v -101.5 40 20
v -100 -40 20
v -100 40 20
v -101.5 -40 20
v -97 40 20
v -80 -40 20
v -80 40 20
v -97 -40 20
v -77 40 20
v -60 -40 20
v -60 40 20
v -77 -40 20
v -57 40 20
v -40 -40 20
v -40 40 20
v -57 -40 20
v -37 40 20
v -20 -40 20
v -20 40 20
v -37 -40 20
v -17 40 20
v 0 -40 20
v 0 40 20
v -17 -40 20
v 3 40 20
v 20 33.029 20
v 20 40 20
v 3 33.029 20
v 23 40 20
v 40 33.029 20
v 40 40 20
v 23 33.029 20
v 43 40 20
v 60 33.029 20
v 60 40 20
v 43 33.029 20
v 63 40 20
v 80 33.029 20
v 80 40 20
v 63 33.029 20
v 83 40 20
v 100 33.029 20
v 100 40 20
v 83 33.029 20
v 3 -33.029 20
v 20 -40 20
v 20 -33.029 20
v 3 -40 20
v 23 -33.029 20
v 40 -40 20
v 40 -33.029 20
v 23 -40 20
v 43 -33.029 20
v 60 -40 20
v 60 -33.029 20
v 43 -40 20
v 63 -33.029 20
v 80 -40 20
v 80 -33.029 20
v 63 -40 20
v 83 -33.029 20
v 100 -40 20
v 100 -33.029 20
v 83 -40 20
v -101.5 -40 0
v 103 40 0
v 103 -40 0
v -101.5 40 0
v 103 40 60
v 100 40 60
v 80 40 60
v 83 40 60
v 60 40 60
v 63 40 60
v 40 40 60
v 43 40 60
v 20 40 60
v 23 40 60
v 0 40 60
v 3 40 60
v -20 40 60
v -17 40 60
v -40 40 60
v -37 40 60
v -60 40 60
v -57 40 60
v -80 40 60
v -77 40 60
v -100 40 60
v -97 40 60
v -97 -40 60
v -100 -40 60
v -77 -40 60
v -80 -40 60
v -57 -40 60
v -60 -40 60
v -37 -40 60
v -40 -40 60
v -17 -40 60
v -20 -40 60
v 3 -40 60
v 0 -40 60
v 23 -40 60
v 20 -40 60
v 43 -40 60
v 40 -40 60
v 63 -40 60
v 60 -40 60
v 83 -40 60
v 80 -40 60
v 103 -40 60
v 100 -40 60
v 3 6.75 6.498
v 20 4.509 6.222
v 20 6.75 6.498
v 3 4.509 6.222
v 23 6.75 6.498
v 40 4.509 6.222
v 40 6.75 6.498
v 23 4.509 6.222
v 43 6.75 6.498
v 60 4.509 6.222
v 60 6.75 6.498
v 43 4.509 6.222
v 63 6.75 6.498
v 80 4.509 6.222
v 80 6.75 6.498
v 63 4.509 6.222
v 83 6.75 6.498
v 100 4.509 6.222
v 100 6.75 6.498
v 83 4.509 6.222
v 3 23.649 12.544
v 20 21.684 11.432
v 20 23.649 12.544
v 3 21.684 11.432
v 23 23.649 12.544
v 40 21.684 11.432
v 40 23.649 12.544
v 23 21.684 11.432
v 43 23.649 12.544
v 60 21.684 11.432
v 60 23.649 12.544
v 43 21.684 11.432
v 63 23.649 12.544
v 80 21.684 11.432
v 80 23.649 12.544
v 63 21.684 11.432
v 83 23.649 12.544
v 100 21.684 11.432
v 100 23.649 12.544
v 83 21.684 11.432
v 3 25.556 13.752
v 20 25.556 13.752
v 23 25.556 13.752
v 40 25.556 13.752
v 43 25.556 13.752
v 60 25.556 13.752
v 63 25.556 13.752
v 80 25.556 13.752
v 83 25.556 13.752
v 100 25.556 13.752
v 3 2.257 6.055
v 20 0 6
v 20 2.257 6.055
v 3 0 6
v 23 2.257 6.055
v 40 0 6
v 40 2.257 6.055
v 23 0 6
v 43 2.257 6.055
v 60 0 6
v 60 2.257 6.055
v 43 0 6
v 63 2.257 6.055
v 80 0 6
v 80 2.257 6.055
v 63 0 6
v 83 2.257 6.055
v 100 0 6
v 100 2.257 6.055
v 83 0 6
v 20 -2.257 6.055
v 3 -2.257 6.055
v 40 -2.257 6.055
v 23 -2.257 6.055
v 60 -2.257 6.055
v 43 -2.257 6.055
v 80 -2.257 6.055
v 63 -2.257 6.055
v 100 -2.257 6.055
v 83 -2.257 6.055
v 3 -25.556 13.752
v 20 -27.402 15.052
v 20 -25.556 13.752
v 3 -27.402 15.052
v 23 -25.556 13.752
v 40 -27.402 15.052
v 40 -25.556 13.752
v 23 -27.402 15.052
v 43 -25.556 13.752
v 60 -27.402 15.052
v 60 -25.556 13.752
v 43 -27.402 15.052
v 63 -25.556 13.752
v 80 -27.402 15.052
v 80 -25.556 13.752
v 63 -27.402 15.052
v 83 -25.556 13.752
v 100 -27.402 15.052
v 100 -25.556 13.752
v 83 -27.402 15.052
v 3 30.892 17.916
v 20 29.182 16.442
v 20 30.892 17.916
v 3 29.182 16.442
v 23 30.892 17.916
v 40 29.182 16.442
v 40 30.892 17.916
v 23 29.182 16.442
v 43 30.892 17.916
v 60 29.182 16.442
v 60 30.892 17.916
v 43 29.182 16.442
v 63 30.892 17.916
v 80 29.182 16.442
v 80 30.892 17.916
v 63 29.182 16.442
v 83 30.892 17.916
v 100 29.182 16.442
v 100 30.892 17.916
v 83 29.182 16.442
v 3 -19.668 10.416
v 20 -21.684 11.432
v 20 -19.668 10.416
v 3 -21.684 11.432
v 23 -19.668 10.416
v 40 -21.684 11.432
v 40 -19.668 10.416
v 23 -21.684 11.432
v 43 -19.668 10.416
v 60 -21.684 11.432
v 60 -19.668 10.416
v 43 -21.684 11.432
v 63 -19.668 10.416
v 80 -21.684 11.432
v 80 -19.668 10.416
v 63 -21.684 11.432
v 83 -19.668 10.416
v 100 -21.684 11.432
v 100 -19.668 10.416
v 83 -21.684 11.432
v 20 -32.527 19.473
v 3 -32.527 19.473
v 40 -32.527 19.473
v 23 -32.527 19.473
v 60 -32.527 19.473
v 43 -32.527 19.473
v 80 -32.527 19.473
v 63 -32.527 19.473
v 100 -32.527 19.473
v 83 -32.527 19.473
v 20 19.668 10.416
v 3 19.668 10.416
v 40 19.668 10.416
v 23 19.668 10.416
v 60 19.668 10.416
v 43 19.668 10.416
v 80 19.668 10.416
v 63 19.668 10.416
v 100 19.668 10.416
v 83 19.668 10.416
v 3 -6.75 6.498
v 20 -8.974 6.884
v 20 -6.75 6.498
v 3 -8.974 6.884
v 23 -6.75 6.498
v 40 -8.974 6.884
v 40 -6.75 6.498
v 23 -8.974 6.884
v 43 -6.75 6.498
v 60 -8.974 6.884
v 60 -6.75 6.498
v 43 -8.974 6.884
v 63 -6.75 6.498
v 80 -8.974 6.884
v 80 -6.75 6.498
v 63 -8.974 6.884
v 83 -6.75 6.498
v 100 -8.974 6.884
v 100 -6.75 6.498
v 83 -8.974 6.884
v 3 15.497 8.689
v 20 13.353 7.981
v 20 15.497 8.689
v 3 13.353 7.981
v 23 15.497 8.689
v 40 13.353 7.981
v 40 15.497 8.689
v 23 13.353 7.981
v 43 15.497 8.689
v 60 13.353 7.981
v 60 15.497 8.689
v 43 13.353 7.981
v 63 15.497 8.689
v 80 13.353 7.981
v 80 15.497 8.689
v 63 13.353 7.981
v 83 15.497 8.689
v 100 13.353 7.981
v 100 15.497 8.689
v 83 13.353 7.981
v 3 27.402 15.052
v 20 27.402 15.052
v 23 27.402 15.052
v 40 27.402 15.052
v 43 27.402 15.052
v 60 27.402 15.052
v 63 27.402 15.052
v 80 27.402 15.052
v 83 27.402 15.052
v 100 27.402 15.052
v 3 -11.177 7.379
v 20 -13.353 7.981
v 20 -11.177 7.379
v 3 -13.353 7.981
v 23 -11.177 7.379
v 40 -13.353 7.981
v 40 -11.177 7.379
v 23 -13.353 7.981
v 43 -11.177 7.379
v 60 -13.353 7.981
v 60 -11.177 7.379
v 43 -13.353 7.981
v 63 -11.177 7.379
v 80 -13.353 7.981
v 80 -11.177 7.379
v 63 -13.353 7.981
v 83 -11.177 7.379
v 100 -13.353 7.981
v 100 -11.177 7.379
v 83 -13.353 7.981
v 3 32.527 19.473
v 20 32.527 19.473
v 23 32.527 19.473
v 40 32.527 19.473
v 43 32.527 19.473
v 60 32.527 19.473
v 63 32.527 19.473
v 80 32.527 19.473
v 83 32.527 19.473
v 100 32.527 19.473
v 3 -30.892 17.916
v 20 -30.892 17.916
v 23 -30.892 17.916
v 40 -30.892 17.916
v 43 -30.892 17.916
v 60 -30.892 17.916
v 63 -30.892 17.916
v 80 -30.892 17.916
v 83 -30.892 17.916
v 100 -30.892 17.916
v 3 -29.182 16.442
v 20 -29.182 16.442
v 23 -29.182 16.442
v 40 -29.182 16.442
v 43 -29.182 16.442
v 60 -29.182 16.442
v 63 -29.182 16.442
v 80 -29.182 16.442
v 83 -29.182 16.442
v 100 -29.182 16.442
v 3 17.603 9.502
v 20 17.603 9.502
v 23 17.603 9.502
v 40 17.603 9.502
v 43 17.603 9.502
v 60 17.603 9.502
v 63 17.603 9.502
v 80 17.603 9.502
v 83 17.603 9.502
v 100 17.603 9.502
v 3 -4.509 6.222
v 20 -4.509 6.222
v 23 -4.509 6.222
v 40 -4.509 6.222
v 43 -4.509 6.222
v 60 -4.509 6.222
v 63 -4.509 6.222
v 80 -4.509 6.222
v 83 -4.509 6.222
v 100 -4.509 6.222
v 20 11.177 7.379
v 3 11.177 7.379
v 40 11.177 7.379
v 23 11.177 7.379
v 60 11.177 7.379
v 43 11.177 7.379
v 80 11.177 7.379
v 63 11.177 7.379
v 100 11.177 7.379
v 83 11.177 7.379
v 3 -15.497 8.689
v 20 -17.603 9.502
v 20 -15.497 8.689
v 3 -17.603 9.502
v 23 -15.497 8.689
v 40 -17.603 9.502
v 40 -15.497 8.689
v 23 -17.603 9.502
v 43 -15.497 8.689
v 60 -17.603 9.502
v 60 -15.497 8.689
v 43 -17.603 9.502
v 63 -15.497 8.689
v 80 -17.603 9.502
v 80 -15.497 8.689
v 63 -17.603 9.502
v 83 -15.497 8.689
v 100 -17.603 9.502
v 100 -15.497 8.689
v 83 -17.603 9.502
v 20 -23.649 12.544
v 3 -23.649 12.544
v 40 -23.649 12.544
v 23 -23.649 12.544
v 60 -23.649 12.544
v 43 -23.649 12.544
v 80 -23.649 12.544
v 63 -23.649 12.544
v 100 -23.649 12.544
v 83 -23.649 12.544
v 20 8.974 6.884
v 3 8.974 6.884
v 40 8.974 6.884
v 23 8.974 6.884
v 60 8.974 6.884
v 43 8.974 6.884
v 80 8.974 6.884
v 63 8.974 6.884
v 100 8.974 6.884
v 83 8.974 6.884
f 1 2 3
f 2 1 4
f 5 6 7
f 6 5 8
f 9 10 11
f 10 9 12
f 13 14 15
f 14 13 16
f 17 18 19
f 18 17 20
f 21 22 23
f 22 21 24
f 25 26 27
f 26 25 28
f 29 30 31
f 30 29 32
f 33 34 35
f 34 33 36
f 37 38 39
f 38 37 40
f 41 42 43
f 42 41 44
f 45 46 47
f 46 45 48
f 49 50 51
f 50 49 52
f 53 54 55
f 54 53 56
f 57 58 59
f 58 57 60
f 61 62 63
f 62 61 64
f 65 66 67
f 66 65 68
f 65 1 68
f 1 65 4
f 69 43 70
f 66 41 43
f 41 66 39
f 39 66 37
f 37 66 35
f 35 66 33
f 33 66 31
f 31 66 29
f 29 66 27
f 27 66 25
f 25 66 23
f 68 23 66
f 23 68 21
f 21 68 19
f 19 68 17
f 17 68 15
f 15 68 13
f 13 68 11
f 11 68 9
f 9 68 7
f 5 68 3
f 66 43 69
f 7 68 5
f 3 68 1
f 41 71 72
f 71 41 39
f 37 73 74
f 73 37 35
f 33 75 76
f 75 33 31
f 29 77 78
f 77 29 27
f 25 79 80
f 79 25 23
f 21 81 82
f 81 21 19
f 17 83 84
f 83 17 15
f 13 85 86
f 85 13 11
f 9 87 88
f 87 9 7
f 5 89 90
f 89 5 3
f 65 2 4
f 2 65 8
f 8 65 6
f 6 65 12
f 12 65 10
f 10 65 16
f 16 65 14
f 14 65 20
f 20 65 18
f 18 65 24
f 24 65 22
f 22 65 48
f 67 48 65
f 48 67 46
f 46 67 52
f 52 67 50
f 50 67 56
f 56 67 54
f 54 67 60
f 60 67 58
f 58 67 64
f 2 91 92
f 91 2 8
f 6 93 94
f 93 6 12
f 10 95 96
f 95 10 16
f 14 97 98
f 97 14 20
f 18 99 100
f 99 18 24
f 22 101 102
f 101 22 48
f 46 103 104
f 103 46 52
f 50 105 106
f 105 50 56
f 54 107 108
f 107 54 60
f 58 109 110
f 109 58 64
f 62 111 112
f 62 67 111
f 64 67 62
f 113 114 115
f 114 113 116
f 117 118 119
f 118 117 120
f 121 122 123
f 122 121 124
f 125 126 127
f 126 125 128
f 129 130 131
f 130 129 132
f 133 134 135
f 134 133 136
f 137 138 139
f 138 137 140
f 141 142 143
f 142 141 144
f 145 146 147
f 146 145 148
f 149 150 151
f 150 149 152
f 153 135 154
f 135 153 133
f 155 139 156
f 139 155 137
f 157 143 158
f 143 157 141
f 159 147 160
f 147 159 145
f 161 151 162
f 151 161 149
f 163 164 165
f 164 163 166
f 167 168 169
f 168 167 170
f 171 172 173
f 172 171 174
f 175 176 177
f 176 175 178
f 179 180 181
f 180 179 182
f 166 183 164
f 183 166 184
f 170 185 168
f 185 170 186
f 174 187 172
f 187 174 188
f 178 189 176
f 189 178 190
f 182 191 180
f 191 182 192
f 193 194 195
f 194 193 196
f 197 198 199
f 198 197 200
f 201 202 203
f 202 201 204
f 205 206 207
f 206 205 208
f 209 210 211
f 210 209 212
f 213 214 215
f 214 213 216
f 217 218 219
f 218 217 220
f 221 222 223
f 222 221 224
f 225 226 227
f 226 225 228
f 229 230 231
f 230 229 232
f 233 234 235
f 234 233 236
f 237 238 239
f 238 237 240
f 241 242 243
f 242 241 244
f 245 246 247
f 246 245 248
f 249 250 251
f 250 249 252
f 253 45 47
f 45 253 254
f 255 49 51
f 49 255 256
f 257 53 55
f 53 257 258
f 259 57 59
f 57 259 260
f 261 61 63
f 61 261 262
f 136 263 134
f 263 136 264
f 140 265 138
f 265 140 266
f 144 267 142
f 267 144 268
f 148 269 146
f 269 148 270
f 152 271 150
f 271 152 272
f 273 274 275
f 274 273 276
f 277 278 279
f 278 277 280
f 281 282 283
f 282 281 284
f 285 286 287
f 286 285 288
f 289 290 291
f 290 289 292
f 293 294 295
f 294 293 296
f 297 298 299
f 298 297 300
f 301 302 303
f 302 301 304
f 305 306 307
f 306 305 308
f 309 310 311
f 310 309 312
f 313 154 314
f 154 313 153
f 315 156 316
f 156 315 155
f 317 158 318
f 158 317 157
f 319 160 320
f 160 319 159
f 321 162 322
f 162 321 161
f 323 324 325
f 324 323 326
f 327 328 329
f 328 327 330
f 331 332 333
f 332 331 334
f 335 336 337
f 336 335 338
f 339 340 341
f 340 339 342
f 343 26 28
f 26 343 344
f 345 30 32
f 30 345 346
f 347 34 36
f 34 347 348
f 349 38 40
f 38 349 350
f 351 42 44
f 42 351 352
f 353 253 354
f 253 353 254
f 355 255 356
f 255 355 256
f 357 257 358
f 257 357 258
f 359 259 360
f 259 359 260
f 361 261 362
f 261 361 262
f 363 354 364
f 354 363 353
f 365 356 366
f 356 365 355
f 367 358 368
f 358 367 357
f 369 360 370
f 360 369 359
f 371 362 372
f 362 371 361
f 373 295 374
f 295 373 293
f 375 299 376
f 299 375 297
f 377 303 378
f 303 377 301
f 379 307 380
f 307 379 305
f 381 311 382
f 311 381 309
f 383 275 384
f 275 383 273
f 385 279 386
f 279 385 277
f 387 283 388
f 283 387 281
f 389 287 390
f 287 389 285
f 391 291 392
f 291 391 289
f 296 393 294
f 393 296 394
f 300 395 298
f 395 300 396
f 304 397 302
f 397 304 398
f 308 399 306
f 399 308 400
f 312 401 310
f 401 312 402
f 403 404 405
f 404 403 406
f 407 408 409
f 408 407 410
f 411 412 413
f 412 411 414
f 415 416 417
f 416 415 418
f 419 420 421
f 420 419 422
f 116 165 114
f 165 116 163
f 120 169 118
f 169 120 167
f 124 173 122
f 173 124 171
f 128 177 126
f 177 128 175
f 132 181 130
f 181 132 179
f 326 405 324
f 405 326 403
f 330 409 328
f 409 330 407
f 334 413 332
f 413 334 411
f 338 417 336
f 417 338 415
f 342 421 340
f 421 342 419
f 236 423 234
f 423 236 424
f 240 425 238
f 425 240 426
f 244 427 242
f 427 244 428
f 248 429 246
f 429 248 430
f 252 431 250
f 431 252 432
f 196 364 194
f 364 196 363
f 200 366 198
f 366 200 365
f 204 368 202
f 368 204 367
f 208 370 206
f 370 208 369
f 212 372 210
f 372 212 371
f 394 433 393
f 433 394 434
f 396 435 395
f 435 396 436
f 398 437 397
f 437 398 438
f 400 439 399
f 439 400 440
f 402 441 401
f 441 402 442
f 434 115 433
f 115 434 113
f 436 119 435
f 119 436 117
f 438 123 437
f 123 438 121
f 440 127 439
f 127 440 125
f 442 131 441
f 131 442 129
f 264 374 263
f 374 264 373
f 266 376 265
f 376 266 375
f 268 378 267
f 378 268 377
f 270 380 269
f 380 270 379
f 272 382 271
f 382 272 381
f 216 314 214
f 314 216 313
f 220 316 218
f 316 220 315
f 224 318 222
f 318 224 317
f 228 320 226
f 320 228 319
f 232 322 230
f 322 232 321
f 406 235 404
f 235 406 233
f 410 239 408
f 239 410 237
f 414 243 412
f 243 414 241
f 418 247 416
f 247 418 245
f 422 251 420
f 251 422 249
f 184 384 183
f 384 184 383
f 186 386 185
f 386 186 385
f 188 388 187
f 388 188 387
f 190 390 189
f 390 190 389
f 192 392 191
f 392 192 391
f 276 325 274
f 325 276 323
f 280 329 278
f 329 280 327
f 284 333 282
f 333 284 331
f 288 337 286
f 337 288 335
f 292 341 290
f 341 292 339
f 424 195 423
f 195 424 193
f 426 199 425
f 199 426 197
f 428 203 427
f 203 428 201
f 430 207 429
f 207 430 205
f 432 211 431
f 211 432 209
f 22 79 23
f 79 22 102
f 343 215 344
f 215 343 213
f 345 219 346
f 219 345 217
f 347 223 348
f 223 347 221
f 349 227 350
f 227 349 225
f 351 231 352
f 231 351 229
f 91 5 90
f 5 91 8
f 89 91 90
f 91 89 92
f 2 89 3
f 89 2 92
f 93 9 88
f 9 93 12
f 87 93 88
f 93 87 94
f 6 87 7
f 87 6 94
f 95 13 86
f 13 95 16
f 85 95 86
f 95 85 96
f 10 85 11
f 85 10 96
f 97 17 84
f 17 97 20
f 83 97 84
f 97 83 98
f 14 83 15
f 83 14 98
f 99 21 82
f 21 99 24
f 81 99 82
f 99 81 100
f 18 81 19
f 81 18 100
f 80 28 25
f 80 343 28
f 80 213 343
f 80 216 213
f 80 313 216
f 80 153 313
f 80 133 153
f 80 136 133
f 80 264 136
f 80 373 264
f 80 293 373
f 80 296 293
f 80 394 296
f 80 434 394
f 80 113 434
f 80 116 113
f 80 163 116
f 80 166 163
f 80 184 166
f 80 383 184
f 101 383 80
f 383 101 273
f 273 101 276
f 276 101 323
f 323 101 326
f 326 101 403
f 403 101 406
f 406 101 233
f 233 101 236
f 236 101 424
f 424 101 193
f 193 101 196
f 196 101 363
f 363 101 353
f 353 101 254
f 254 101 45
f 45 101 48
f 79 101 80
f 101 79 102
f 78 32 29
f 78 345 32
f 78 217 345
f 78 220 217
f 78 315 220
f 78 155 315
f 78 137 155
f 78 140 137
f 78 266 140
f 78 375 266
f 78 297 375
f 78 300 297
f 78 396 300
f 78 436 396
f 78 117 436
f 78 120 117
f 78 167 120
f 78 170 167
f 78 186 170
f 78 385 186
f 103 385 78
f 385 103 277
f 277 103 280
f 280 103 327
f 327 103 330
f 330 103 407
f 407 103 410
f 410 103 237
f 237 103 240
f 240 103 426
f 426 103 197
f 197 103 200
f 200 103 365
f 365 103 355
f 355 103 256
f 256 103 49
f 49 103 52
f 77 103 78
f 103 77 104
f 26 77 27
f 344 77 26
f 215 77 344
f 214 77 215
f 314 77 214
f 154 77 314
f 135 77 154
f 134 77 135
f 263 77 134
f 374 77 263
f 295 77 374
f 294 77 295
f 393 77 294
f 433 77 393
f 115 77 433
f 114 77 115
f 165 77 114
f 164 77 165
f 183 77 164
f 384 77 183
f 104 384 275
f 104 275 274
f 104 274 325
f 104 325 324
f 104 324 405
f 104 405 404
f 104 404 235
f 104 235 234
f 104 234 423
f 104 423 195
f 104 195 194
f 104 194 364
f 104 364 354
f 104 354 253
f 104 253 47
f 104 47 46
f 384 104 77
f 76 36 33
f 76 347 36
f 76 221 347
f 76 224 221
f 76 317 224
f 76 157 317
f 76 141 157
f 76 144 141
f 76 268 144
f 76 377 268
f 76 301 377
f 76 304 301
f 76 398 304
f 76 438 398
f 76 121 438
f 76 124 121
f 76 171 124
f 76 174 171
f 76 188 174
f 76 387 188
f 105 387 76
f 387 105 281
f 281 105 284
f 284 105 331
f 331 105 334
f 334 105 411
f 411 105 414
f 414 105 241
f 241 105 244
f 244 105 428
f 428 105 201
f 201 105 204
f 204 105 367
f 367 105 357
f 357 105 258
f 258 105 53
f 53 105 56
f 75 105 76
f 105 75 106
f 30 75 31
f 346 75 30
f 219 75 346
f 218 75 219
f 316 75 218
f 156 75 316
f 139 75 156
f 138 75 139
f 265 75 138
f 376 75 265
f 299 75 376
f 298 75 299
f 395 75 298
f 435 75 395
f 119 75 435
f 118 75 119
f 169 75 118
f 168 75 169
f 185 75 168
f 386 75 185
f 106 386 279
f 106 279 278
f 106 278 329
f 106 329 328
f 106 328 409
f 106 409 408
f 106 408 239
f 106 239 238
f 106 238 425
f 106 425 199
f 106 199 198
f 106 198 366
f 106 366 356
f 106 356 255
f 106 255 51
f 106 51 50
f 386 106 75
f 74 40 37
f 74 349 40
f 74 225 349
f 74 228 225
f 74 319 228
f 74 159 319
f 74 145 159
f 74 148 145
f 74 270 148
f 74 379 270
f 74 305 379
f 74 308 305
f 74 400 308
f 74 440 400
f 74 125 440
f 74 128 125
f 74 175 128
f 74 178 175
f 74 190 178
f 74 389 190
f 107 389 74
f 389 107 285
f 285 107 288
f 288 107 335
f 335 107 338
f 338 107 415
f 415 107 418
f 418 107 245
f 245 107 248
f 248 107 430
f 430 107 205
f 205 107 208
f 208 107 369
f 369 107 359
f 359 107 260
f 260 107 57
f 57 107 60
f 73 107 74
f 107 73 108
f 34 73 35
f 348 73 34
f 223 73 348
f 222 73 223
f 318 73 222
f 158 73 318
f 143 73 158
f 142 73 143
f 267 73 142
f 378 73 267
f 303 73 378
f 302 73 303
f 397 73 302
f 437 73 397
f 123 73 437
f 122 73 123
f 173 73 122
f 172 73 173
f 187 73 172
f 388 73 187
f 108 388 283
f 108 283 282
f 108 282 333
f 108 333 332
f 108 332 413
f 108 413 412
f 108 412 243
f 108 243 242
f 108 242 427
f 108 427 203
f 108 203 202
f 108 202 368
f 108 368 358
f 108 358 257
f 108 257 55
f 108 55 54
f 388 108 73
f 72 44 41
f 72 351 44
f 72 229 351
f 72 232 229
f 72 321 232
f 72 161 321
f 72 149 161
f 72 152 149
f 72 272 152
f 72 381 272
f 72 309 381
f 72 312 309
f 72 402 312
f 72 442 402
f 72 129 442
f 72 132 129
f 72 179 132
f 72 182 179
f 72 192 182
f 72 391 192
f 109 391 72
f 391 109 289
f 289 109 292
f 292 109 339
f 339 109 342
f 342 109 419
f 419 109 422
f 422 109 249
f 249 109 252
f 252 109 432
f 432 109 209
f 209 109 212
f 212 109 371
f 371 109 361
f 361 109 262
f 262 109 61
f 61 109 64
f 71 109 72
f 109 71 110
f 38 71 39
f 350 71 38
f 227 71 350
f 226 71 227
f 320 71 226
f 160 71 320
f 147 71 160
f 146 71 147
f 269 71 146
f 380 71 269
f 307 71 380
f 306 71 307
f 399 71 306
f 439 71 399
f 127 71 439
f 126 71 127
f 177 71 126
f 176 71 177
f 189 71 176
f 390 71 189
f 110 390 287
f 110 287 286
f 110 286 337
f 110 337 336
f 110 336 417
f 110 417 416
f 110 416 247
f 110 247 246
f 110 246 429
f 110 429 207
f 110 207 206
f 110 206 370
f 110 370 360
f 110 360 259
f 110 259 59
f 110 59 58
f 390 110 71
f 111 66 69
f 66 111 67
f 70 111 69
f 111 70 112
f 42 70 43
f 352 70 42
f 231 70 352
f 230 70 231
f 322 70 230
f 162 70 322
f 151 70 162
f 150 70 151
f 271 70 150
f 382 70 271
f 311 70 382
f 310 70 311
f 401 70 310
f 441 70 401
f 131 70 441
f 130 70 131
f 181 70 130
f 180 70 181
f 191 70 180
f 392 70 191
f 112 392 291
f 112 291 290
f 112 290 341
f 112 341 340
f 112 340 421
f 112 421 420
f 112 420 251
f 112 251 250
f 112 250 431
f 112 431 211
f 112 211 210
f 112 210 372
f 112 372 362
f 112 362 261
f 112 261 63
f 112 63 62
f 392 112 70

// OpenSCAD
// Petri Dish Rack
// Designed for 90mm diameter dishes standing on edge.

// --- Dimensions ---
base_l      = 203.0;  // Length of base (X)
base_w      = 80.0;   // Width of base (Y)
base_h      = 20.0;   // Height of base (Z)

dish_radius = 45.0;   // Radius of 90mm dish
cradle_r    = 46.0;   // Radius of the cutting cylinder
cradle_z    = 52.0;   // Z-offset of the cylinder axis (bottoms at 52-46=6mm)

num_dividers = 11;     // Number of vertical plates
divider_t    = 3.0;    // Thickness of each divider (X)
divider_h    = 60.0;   // Height of dividers (Z)
divider_w    = 80.0;   // Width of dividers (Y)

// Spacing calculation: 
// 11 dividers create 10 slots. 
// Total length covered by dividers is from -100 to 100.
x_start      = -100.0;
x_end        = 100.0;
x_step       = 20.0;

$fn = 128;

// --- Modeling ---

// The base block
module base() {
    // Centered on X and Y, sitting on Z=0
    translate([-base_l/2, -base_w/2, 0])
        cube([base_l, base_w, base_h]);
}

// The vertical dividers
module dividers() {
    for (i = [0 : num_dividers - 1]) {
        x_pos = x_start + (i * x_step);
        translate([x_pos, -divider_w/2, 0])
            cube([divider_t, divider_w, divider_h]);
    }
}

// The cradle (the curved groove)
// The axis runs along X at y=0, z=52.
module cradle_cutter() {
    // To place a cylinder axis at (y=0, z=52) running along X:
    // 1. Start at origin.
    // 2. Rotate 90 deg around Y so it lies on X.
    // 3. Translate to the target Z (52) and Y (0).
    // 4. Make it long enough to clear the base.
    translate([0, 0, cradle_z])
        rotate([0, 90, 0])
            cylinder(h = base_l + 2, d = cradle_r * 2);
}

// Final Assembly
// Rule: "The cradle is not cut through them [the dividers]"
// This means we calculate (Base - Cradle) and then add Dividers.

union() {
    // Part 1: The base with the cradle cut out
    difference() {
        base();
        // We use a small epsilon/overlap to ensure clean cuts
        translate([0, 0, 0]) 
            cradle_cutter();
    }
    
    // Part 2: The solid dividers
    dividers();
}
